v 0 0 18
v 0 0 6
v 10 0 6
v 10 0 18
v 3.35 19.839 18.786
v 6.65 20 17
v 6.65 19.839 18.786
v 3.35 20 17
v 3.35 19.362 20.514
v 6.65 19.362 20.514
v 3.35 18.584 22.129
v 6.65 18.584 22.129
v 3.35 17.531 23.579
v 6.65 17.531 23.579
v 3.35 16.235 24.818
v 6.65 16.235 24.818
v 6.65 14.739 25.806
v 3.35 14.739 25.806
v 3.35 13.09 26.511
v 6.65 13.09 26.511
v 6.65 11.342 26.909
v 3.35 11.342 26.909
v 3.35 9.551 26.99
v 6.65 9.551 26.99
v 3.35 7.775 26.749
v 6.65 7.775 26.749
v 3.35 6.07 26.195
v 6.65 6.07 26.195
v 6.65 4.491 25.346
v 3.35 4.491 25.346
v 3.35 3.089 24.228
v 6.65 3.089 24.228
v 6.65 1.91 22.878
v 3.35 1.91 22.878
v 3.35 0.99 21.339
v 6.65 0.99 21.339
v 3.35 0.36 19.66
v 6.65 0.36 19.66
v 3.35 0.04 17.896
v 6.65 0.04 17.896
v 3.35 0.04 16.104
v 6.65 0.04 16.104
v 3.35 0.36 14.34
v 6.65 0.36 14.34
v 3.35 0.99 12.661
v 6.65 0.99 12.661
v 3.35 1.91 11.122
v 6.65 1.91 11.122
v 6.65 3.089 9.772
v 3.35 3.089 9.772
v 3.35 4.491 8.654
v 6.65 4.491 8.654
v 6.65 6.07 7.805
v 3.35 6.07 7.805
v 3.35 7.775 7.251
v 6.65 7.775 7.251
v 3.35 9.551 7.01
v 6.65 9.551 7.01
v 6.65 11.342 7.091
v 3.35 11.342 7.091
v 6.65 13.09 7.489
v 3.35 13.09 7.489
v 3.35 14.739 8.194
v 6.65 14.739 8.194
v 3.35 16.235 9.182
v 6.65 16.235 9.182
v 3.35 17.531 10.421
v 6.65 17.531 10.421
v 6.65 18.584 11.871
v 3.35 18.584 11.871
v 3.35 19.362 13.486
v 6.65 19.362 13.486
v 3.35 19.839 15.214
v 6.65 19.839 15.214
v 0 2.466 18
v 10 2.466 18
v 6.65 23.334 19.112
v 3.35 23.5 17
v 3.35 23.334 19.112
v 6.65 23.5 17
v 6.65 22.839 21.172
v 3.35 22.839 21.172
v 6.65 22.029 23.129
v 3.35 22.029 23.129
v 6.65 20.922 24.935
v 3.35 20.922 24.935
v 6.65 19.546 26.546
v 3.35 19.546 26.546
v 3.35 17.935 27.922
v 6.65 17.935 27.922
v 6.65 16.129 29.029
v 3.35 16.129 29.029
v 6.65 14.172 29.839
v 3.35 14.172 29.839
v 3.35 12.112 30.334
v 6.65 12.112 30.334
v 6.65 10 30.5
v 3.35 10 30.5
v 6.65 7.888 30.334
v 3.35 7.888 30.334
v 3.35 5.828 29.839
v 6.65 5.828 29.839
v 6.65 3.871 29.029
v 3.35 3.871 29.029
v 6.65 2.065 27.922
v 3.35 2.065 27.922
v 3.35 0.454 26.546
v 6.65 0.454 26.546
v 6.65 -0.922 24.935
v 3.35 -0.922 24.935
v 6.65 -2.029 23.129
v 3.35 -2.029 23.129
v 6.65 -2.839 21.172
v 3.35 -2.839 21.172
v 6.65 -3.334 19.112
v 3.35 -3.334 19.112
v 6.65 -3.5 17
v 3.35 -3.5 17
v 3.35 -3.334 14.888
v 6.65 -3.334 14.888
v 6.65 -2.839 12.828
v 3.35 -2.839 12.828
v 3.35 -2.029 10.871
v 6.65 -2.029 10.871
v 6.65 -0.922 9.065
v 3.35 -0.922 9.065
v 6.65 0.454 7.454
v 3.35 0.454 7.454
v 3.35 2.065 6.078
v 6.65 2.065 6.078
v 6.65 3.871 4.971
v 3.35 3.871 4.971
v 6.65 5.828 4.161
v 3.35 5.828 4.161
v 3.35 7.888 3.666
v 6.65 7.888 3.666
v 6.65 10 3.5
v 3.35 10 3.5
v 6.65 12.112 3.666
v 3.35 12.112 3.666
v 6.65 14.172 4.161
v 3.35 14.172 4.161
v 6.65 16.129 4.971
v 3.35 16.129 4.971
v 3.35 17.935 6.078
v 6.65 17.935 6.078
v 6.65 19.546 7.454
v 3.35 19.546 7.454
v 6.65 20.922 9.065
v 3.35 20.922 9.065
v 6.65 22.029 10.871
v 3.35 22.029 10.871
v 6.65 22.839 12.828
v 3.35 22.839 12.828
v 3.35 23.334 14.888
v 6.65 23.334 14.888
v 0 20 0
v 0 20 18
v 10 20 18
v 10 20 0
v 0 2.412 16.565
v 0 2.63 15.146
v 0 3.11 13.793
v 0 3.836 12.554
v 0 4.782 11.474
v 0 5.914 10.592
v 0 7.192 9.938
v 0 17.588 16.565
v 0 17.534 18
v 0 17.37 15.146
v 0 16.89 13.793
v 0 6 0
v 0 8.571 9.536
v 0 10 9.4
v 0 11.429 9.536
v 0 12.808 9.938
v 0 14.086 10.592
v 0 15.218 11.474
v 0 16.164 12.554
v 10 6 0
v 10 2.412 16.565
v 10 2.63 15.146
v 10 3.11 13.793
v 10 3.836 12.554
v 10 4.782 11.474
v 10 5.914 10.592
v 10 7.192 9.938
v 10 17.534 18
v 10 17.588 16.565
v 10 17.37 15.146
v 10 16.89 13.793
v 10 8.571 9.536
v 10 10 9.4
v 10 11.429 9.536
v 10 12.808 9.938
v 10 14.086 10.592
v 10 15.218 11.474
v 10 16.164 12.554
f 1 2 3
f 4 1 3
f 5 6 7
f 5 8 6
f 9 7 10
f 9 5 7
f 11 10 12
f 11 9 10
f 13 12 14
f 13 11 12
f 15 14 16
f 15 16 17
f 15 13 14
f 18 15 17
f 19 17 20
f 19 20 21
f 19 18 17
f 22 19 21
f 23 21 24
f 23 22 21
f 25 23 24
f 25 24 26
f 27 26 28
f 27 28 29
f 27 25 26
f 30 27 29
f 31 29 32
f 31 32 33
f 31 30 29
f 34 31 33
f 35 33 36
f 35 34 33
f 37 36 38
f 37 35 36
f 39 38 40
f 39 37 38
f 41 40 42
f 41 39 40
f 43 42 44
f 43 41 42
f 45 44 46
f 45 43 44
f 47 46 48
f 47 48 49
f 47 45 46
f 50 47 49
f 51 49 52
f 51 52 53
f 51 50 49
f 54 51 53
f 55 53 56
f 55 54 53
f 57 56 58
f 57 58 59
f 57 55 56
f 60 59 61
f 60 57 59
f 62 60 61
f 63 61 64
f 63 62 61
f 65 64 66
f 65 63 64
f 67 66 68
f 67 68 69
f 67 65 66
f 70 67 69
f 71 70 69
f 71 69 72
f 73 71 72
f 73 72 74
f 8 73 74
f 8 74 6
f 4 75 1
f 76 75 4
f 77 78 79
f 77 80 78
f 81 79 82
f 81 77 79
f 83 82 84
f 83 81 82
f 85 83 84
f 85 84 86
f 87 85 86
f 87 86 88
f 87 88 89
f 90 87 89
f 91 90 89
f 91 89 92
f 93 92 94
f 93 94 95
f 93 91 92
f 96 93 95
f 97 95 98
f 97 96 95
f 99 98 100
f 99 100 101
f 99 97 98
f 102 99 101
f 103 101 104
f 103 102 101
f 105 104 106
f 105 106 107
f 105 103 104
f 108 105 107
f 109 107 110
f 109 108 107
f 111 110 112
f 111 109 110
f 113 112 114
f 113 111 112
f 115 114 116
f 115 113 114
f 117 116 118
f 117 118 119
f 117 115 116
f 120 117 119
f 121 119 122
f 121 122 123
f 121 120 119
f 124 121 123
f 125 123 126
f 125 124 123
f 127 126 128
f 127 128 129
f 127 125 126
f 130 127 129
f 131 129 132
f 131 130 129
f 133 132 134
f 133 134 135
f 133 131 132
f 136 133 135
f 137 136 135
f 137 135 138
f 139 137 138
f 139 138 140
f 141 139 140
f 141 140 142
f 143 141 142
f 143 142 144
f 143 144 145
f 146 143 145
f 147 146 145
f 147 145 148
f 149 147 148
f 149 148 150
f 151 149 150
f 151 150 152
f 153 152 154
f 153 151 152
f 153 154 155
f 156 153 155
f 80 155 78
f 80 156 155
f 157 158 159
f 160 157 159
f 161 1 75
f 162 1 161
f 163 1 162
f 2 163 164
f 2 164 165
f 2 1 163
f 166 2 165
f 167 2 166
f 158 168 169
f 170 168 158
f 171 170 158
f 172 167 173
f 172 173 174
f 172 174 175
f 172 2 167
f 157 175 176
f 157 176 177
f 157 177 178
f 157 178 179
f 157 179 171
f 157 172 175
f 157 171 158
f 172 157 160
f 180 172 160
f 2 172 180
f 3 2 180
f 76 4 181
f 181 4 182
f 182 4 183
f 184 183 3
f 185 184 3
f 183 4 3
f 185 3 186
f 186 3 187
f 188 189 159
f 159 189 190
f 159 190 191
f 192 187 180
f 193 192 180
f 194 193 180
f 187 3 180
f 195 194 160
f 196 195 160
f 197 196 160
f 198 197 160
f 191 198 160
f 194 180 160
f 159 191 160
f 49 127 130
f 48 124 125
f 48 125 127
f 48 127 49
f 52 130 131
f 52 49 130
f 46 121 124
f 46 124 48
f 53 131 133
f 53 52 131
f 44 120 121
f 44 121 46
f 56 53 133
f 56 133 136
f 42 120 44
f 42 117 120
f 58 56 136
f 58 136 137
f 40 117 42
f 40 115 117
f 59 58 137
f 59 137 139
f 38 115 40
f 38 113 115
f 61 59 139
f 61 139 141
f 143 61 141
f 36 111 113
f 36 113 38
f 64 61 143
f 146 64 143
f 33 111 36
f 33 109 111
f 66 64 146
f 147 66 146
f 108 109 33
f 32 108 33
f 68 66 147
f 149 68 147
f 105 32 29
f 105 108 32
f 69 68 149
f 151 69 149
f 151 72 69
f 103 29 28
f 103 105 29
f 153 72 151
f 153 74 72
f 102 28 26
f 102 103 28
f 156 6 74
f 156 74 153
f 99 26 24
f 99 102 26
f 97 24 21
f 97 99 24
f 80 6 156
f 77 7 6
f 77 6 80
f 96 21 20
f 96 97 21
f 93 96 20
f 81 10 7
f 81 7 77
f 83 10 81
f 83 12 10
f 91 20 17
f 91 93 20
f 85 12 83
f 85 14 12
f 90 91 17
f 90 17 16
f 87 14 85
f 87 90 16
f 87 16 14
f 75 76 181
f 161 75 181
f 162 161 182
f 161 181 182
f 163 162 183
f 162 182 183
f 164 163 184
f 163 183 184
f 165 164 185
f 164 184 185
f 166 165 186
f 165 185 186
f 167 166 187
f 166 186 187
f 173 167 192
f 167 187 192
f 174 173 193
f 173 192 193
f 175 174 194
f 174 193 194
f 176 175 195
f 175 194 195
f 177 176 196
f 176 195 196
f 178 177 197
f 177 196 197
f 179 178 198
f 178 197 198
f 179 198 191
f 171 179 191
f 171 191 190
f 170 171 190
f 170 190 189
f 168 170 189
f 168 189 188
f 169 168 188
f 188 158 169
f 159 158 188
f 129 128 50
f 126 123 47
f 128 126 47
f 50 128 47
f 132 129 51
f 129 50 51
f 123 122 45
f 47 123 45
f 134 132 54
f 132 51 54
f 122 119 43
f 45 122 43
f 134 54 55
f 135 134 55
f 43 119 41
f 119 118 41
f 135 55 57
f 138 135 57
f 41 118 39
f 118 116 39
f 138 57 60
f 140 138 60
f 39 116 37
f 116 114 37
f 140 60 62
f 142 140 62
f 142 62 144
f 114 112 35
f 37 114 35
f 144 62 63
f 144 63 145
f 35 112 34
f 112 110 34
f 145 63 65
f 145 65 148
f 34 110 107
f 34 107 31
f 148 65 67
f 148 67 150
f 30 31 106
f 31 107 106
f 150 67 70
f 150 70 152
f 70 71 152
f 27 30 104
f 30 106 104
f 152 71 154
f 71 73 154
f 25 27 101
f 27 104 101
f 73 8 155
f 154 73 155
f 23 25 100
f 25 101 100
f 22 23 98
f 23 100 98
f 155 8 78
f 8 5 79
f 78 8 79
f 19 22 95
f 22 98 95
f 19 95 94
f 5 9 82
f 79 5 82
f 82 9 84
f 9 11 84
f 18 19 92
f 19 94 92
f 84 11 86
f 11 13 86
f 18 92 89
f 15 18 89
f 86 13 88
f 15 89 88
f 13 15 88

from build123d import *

# Parameters (mm, degrees)
F0_W     = 10
F0_H     = 20
F1_DEPTH = 18
F2_R     = 7.6
F3_DEPTH = 10.001
F5_R     = 13.5
F5_R_2   = 10
F6_DEPTH = 1.65
F7_SIZE  = 6


with BuildPart() as f1:
    # F0 (on Top) → F1 (new body)
    with BuildSketch(Plane.XY):
        with Locations((5, 10)):
            Rectangle(F0_W, F0_H)
    extrude(amount=F1_DEPTH)

    # F2 (on face) → F3 (cut, through all)
    with BuildSketch(Plane.YZ.offset(10)):
        with Locations((10, 17)):
            Circle(F2_R)
    extrude(amount=-F3_DEPTH, mode=Mode.SUBTRACT)

    # F7
    f7_edges = [f1.edges().sort_by_distance(p)[0] for p in [
        (5, 0, 0),
    ]]
    chamfer(f7_edges, length=F7_SIZE)


with BuildPart() as f6:
    # F5 (on mid) → F6 (new body, symmetric)
    with BuildSketch(Plane.YZ.offset(5)):
        with Locations((10, 17)):
            Circle(F5_R)
        with Locations((10, 17)):
            Circle(F5_R_2, mode=Mode.SUBTRACT)
    extrude(amount=F6_DEPTH, both=True)


solid = Compound([f1.part, f6.part])
